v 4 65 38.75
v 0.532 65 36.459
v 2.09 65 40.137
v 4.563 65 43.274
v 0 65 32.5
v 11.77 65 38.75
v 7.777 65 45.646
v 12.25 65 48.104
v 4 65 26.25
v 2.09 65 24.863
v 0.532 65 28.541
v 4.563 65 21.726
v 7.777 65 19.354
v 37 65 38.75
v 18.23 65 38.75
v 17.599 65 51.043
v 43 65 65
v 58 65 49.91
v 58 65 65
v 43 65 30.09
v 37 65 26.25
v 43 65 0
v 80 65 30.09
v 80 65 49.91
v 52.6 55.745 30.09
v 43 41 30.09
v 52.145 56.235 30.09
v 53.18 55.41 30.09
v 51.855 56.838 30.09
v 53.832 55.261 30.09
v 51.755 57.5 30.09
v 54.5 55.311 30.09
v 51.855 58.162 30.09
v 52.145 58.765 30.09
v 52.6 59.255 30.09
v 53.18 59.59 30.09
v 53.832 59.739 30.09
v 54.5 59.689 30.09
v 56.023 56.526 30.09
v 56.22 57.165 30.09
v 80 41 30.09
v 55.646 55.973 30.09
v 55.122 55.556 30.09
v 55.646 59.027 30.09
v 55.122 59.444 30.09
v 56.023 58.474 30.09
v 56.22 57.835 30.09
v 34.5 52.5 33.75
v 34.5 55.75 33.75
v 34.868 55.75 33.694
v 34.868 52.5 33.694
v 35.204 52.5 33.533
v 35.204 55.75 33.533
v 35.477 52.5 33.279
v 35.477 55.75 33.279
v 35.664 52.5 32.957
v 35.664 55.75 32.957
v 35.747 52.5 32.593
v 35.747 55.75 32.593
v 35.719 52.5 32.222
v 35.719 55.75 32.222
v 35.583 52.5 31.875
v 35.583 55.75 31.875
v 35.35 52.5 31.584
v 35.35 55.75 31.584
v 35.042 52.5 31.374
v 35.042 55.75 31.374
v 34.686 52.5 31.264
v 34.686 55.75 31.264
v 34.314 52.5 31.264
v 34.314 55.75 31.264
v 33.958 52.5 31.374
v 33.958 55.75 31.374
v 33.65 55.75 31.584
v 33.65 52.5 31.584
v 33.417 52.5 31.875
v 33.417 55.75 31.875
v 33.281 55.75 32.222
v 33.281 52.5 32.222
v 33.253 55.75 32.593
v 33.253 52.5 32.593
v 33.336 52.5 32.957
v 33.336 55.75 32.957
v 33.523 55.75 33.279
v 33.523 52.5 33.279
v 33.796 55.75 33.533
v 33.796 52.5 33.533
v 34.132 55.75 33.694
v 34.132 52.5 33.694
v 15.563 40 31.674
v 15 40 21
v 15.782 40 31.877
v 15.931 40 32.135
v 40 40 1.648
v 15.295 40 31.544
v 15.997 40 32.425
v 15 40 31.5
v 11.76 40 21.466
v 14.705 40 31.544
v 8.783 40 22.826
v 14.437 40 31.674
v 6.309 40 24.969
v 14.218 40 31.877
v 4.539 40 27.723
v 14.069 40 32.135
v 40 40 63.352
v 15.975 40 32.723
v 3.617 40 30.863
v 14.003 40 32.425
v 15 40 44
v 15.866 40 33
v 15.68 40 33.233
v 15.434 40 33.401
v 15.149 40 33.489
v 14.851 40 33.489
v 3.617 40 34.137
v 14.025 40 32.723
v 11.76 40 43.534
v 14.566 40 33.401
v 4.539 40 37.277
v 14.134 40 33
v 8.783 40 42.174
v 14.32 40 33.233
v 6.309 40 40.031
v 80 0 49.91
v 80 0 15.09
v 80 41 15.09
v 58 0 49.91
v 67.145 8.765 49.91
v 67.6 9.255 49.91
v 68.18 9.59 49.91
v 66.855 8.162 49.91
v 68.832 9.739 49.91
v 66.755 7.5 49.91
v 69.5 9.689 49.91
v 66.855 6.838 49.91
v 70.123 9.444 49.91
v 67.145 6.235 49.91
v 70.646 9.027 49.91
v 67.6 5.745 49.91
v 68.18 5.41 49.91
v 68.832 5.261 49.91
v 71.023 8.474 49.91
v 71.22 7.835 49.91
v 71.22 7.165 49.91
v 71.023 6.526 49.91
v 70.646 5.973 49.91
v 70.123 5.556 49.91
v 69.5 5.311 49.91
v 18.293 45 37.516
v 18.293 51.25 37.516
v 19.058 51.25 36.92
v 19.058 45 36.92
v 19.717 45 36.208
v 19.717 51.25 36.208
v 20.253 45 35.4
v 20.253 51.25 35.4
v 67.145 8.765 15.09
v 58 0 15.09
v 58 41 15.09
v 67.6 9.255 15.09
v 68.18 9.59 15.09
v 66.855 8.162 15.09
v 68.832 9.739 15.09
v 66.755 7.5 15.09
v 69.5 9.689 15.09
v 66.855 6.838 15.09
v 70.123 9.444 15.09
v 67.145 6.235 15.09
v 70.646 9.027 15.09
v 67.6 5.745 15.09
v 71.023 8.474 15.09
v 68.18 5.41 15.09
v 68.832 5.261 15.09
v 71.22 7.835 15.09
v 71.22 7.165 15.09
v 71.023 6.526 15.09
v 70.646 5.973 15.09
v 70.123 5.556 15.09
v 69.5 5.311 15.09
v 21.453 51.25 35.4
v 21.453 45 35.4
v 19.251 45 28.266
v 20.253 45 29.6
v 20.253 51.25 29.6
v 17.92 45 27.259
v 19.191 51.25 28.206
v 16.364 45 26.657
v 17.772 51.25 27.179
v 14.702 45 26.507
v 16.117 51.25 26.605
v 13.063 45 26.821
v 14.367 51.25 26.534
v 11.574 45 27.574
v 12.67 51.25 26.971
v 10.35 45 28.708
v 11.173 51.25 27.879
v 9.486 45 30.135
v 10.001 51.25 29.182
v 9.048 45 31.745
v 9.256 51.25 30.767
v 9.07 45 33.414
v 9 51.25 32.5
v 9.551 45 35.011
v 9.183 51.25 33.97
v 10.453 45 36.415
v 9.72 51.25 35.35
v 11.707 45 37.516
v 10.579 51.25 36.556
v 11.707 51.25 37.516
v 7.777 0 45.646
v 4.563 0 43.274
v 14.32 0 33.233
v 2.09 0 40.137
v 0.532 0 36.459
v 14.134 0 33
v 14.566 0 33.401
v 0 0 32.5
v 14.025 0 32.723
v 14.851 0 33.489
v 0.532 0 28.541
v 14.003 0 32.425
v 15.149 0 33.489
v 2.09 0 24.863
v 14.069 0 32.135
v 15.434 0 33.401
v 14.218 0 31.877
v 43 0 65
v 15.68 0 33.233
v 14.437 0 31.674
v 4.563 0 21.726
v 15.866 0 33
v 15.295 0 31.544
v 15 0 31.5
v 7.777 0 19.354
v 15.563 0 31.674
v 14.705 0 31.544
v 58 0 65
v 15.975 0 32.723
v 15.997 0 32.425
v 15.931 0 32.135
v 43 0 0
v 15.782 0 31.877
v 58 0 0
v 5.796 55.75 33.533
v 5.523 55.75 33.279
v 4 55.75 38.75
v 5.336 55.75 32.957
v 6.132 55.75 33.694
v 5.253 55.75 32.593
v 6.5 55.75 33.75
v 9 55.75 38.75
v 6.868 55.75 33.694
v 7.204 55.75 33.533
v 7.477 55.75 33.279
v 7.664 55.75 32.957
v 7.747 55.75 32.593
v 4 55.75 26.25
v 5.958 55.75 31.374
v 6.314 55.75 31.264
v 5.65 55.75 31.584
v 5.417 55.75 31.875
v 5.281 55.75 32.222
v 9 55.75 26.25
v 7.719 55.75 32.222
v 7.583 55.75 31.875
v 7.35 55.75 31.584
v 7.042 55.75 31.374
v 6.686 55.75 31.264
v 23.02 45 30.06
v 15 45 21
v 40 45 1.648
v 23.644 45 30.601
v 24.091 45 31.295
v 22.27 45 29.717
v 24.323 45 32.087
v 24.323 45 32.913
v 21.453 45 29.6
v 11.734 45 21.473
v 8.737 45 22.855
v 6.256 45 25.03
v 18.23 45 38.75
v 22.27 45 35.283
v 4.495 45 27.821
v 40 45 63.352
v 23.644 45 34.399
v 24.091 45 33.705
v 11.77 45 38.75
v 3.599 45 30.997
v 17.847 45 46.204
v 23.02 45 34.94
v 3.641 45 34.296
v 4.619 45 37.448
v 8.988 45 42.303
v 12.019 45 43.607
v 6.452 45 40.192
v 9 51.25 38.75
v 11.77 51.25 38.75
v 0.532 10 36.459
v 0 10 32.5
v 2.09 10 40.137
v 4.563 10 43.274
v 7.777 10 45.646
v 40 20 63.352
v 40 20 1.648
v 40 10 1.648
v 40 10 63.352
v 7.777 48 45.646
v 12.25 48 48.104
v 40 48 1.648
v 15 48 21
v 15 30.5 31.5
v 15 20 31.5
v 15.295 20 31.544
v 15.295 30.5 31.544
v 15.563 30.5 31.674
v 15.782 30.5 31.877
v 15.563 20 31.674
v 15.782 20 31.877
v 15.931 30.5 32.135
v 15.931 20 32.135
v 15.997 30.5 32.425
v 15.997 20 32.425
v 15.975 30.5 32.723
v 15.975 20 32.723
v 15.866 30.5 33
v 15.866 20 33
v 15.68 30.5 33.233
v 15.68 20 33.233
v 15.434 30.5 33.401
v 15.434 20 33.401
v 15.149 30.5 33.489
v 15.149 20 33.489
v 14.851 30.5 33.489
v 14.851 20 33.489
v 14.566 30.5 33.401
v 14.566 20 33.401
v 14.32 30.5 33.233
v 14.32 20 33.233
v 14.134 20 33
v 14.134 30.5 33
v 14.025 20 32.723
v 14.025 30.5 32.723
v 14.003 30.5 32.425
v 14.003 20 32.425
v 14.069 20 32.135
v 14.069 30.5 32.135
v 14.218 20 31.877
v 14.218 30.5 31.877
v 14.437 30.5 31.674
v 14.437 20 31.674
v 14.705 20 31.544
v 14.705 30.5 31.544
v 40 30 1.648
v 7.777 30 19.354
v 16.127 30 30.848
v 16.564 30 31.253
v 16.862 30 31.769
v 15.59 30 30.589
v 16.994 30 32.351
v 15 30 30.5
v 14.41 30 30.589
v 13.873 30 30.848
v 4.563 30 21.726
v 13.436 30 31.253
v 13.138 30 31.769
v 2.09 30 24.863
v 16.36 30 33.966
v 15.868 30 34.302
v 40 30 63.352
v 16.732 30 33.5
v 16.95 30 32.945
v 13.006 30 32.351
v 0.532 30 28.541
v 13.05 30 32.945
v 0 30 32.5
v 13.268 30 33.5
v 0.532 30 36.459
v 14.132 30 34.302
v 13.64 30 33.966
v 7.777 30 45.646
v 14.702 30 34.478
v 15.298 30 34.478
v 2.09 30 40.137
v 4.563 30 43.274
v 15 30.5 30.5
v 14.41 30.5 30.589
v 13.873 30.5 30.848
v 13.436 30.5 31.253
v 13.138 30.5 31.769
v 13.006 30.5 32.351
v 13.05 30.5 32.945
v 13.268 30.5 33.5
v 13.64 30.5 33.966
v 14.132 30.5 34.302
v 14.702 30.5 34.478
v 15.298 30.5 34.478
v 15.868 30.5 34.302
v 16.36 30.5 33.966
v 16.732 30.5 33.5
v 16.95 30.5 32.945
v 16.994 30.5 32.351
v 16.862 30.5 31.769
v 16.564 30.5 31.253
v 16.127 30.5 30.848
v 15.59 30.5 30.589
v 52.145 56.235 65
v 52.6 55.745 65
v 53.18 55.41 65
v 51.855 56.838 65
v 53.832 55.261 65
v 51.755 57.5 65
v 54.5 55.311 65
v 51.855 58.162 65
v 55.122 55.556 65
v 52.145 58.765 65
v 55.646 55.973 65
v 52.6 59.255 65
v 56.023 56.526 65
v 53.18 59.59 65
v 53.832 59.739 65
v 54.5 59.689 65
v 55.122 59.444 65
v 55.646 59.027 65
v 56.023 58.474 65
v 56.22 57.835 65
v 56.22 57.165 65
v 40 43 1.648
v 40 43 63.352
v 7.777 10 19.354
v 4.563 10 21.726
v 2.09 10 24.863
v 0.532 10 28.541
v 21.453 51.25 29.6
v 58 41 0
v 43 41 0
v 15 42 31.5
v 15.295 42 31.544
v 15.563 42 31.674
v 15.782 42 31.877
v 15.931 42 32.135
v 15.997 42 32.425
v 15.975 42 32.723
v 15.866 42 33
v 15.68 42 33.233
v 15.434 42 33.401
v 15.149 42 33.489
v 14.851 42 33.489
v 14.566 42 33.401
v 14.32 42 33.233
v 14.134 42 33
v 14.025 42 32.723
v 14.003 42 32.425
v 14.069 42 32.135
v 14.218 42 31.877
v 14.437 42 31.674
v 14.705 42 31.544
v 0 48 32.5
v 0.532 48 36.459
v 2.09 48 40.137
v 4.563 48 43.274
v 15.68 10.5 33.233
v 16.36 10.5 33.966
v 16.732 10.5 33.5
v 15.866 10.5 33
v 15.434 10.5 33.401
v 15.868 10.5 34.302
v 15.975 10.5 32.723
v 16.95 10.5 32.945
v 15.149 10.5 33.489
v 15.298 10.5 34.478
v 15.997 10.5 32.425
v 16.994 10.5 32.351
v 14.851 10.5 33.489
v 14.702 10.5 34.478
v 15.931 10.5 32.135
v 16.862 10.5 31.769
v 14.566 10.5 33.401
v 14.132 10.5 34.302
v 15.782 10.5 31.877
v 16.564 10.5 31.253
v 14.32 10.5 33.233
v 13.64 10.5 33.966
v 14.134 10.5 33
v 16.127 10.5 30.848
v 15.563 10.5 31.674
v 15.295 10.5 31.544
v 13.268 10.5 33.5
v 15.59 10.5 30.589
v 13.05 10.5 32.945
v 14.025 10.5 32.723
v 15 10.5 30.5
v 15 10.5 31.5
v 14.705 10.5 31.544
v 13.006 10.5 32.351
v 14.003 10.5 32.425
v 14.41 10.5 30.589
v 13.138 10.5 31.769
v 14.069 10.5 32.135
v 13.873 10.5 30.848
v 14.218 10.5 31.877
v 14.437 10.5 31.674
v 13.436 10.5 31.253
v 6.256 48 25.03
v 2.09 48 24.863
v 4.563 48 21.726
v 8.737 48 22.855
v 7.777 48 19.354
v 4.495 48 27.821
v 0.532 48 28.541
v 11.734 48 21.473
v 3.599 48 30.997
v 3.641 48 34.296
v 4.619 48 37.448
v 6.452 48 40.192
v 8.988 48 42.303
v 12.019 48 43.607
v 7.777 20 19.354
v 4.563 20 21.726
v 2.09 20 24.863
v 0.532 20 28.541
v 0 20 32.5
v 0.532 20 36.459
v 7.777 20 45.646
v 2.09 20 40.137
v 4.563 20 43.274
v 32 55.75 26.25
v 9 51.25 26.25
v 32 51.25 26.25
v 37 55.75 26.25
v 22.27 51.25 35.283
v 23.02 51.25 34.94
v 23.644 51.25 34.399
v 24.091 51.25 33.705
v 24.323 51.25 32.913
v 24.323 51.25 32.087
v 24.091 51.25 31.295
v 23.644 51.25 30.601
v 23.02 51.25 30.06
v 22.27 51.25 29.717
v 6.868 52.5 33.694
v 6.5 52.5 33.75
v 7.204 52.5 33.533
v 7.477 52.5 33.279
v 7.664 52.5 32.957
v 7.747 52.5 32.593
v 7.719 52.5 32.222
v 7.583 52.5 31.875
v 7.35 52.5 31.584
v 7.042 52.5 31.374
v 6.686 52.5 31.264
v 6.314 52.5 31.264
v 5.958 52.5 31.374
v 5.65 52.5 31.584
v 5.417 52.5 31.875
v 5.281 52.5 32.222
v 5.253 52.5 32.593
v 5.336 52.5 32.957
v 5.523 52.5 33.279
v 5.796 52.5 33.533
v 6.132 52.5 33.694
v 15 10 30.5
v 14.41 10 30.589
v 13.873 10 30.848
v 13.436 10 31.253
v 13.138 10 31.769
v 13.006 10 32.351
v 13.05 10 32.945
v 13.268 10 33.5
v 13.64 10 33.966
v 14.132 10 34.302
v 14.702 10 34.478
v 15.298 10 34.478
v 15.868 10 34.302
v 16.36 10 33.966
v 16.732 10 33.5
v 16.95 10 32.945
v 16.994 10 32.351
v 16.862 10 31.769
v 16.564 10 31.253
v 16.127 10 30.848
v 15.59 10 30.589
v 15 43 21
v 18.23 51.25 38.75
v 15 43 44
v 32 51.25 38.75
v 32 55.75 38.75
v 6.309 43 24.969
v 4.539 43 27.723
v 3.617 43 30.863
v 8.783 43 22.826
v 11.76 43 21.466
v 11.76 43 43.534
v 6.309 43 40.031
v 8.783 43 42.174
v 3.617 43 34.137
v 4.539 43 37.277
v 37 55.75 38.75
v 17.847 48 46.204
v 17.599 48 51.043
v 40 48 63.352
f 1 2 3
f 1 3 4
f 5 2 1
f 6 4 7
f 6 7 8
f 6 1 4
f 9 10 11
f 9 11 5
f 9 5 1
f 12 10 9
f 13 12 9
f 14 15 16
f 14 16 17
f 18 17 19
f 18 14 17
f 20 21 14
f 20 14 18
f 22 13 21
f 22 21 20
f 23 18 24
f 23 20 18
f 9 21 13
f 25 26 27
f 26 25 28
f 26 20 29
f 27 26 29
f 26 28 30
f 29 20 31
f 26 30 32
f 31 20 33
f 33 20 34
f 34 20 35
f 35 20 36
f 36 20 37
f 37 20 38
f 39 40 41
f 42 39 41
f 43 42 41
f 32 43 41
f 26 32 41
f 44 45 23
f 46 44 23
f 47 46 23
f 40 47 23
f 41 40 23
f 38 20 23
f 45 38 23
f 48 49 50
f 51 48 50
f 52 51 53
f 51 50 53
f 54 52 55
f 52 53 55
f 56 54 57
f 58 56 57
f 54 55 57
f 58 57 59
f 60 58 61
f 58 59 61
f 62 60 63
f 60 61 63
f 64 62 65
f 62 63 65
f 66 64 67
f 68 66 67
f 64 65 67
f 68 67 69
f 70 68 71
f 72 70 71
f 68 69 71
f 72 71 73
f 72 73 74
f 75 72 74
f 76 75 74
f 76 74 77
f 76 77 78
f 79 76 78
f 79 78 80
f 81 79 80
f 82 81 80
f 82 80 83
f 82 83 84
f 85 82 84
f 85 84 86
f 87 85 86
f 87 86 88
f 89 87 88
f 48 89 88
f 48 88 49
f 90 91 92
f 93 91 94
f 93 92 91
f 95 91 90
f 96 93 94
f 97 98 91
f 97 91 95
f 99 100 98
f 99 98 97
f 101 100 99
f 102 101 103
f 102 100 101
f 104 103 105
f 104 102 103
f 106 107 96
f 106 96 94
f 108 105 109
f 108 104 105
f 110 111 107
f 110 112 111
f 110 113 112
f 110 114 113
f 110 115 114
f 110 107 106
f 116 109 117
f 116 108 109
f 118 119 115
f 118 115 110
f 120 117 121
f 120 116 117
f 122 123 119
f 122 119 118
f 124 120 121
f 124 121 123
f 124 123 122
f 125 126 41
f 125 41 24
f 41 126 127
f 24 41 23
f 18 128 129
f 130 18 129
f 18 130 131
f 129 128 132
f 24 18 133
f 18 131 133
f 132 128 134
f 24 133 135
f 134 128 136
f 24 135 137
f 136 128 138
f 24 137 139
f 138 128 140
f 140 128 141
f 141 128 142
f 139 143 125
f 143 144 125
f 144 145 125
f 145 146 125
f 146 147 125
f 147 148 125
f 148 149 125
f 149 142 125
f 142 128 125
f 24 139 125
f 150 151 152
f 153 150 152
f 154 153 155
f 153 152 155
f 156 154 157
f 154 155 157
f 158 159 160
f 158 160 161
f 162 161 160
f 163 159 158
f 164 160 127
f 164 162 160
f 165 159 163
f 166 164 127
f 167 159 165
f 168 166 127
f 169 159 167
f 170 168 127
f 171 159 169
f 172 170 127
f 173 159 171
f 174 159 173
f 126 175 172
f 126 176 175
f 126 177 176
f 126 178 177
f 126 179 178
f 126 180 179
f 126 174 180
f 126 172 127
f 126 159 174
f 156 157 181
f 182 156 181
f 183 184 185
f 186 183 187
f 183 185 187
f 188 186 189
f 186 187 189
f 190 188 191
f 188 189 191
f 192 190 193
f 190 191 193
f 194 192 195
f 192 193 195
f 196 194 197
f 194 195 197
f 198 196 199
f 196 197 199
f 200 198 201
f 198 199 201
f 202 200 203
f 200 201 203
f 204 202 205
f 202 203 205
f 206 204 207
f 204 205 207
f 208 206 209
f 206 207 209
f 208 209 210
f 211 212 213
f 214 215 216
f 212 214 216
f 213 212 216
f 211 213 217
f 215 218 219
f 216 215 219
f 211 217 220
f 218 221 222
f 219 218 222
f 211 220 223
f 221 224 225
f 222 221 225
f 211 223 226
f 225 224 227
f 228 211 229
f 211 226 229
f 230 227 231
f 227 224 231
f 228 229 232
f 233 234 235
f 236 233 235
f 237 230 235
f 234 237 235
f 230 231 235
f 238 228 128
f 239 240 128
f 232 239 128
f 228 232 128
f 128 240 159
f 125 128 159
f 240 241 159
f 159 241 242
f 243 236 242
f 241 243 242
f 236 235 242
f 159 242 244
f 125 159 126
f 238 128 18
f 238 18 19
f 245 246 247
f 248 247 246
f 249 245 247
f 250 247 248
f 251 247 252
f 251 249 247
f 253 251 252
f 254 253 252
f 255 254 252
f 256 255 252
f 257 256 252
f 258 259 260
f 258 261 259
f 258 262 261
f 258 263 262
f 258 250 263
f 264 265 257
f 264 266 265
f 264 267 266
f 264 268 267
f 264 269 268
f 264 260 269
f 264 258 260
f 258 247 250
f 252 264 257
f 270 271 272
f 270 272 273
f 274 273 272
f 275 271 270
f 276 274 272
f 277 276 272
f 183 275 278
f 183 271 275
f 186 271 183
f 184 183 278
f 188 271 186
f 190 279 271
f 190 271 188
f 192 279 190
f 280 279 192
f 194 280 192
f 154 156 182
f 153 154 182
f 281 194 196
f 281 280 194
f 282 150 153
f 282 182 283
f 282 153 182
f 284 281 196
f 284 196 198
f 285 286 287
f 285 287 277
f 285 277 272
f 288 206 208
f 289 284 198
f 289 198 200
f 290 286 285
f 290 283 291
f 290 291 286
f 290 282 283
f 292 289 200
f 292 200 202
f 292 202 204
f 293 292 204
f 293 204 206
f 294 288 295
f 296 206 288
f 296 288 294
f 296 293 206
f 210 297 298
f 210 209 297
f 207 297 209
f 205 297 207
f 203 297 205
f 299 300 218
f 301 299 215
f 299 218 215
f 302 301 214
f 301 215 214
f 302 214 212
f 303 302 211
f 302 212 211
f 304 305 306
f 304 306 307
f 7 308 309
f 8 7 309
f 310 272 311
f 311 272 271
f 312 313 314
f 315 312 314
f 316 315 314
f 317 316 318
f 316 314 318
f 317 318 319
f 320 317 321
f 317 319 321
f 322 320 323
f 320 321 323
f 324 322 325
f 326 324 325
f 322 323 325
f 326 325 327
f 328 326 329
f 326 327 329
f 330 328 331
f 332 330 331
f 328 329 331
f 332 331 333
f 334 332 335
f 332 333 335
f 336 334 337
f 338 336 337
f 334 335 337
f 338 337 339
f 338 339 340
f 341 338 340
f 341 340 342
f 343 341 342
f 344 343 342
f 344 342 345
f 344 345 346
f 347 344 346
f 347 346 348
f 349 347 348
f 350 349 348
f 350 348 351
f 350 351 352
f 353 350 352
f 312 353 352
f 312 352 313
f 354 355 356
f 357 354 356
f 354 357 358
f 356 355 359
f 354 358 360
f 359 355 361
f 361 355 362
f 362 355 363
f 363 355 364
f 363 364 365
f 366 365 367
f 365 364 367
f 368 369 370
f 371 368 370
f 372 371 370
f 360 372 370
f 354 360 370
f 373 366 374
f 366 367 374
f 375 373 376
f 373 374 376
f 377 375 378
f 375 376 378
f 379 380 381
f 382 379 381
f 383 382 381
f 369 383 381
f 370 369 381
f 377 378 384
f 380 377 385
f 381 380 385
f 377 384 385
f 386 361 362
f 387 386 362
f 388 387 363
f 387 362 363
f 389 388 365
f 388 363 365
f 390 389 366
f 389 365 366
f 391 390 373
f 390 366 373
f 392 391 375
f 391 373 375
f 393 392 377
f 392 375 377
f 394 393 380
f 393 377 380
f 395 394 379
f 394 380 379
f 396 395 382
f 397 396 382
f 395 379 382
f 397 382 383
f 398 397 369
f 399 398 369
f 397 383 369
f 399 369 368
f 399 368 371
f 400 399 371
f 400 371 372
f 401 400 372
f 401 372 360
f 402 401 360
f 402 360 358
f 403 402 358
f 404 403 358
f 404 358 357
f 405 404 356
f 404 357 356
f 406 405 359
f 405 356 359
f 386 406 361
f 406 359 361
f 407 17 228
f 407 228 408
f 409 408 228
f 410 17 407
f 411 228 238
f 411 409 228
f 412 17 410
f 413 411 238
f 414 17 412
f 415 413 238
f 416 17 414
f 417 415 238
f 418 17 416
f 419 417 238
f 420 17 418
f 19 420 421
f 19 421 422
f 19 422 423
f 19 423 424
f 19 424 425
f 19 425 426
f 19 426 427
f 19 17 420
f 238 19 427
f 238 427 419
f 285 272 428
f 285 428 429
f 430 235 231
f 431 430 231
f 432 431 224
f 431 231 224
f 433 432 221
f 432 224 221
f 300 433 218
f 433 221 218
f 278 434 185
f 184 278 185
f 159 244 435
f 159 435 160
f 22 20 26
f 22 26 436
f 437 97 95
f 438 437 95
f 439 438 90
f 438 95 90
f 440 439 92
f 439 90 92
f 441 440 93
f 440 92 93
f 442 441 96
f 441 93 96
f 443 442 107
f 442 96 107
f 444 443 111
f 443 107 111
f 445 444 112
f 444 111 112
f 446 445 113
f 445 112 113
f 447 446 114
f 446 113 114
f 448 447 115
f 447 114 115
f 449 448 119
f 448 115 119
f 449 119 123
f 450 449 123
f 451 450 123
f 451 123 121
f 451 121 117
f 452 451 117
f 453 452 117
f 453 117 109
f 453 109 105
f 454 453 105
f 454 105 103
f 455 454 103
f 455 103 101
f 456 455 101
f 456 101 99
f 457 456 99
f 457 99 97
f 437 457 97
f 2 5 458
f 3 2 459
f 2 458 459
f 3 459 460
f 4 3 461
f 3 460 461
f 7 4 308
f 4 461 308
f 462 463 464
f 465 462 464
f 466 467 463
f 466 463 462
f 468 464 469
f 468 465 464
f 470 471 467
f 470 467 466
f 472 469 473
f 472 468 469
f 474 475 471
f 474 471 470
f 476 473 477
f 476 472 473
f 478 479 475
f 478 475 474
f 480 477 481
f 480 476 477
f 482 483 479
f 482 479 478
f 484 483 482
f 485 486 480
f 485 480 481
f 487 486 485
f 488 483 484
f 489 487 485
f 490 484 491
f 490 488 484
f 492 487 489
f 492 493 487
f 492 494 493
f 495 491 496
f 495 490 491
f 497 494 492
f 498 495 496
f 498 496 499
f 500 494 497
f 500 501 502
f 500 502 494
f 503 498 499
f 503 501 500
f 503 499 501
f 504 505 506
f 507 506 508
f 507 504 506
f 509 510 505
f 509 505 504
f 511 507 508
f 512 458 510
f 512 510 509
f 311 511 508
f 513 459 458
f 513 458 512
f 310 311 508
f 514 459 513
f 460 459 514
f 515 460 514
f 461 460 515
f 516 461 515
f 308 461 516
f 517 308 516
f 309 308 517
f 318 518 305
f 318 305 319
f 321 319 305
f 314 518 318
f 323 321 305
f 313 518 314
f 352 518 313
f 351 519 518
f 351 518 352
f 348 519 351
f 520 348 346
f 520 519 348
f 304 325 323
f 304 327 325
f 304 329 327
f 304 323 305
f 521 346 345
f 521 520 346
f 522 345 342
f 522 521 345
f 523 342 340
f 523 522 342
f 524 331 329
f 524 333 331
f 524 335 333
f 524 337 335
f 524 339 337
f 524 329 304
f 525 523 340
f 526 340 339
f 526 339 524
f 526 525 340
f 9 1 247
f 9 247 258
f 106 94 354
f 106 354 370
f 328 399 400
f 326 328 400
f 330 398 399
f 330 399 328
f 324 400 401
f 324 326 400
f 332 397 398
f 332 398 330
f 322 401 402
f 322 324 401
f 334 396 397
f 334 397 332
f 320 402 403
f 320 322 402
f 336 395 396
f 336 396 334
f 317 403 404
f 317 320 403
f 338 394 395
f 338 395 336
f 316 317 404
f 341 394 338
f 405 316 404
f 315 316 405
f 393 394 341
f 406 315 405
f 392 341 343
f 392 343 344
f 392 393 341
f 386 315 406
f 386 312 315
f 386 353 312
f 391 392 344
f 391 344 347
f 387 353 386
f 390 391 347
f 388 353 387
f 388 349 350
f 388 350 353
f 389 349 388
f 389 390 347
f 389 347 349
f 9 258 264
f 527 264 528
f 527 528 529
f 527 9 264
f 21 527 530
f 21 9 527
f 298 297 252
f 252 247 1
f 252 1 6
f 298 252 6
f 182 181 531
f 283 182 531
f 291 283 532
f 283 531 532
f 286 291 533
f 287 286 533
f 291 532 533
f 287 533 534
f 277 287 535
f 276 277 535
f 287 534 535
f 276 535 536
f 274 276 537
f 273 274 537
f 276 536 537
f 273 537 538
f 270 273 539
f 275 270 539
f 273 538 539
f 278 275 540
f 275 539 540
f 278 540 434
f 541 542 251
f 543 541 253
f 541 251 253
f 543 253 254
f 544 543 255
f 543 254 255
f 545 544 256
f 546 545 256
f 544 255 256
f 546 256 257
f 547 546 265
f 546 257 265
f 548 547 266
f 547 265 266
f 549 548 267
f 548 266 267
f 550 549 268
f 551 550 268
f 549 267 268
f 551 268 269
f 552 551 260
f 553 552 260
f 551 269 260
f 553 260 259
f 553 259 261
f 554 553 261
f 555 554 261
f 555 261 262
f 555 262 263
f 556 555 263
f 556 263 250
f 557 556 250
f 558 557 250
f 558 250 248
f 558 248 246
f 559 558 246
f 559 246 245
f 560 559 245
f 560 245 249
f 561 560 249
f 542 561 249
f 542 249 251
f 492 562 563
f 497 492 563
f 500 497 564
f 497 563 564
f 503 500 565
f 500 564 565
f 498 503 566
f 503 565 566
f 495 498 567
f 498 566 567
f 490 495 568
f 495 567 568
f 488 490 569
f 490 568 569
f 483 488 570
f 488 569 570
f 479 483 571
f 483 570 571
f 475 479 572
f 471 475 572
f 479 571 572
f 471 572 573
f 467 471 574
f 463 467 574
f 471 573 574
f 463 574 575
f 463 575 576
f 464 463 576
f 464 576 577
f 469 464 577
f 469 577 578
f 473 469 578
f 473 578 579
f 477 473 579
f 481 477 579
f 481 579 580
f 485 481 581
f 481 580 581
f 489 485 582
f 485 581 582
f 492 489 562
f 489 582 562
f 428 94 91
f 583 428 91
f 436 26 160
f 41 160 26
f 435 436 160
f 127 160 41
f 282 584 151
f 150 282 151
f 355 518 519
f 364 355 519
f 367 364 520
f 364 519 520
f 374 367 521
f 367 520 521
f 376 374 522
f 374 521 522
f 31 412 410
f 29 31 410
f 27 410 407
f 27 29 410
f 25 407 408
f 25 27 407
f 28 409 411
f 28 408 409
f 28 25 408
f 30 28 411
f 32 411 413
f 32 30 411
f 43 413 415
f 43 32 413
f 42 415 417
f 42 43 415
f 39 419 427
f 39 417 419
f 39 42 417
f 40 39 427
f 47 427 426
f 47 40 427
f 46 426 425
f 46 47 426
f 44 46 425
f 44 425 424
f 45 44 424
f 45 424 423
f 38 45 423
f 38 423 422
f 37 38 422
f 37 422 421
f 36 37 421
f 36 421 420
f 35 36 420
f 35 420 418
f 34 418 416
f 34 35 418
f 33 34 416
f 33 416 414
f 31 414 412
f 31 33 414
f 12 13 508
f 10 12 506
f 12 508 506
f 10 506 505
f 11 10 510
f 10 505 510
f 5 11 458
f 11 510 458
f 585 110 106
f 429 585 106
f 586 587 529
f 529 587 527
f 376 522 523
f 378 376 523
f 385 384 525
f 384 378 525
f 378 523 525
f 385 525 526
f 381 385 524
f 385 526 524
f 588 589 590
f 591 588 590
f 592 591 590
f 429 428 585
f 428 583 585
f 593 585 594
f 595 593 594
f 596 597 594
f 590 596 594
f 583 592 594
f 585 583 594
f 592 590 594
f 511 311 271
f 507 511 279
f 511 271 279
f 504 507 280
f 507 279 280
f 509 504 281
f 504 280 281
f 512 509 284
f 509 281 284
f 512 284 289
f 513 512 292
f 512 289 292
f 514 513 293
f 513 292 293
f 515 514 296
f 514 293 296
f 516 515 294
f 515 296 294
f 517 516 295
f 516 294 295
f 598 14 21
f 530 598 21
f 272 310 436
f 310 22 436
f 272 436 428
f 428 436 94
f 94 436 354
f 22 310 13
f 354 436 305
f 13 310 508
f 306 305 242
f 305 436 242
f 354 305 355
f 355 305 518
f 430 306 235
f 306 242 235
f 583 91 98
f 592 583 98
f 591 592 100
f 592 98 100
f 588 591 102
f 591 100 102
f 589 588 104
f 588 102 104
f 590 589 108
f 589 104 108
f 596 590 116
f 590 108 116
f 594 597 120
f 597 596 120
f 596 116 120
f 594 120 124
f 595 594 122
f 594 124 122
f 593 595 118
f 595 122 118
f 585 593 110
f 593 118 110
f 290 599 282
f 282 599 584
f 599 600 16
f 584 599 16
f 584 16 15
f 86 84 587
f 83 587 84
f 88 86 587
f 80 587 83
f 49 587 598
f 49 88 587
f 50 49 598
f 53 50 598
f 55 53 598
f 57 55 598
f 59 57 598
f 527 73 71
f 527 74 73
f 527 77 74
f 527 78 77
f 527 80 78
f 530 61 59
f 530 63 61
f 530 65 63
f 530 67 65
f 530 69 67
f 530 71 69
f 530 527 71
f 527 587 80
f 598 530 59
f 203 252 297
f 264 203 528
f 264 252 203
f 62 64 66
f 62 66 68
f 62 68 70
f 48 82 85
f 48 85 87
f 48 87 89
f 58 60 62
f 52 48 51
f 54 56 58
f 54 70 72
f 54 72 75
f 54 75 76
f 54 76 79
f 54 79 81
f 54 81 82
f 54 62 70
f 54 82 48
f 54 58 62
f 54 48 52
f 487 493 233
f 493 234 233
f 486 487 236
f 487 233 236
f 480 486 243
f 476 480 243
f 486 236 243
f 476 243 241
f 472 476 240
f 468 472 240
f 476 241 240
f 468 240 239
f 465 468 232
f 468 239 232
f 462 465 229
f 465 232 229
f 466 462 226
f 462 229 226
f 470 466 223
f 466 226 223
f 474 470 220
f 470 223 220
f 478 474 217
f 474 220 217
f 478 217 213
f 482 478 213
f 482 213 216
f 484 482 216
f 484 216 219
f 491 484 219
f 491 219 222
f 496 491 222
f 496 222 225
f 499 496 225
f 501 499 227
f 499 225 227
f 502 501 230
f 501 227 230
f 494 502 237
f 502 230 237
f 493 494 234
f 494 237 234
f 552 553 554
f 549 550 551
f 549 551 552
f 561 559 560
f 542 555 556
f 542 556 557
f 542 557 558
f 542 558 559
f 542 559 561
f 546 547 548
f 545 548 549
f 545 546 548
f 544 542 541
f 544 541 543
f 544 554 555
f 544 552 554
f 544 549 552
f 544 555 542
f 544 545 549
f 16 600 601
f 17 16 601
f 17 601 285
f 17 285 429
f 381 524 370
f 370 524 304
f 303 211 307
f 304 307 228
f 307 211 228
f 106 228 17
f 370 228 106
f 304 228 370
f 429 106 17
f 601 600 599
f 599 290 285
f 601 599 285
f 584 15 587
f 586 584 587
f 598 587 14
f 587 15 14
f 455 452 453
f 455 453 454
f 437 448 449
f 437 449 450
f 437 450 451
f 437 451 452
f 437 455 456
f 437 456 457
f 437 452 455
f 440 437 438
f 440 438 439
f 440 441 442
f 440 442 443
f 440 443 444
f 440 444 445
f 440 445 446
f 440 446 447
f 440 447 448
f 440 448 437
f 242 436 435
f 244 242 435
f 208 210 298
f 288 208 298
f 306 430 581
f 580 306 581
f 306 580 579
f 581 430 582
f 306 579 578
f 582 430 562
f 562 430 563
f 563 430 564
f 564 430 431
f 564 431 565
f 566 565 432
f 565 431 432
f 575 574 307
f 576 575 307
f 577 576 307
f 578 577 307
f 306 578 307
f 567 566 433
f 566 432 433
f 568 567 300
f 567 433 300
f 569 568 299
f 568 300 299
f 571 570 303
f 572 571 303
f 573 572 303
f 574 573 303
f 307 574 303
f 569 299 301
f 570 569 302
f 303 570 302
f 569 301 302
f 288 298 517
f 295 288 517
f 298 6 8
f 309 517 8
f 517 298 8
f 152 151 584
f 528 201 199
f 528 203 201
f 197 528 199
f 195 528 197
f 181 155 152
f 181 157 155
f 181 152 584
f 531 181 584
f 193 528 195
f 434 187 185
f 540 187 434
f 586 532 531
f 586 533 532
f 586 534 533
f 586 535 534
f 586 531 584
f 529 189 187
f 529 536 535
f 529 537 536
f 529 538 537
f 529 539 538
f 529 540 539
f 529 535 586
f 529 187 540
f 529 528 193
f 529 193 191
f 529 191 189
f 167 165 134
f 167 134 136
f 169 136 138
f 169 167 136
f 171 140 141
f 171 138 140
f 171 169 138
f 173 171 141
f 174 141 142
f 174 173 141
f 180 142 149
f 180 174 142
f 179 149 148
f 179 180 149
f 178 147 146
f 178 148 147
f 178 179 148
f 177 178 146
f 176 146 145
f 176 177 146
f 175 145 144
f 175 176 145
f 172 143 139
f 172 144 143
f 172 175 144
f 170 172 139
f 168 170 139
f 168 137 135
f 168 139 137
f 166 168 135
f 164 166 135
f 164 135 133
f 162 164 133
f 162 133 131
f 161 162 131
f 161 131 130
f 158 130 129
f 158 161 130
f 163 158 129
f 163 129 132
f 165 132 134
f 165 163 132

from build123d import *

# Parameters (mm, degrees)
SKETCH1_W               = 80
SKETCH1_H               = 65
BOSS_EXTRUDE1_DEPTH     = 65
SKETCH3_W               = 22
SKETCH3_H               = 15.09
CUT_EXTRUDE1_DEPTH      = 65.72
CUT_EXTRUDE2_DEPTH      = 20
CUT_EXTRUDE2_DEPTH_BACK = 55.72
SKETCH4_R               = 2.245
SKETCH4_R_2             = 2.24505
SKETCH5_W               = 65
SKETCH5_H               = 10
SKETCH5_H_2             = 2
CUT_EXTRUDE3_DEPTH      = 40
CUT_EXTRUDE4_DEPTH      = 65
SKETCH10_R              = 1
CUT_EXTRUDE6_DEPTH      = 42
SKETCH12_R              = 2.9
SKETCH12_R_2            = 6
CUT_EXTRUDE7_DEPTH      = 20
SKETCH14_W              = 23
SKETCH14_H              = 12.5
CUT_EXTRUDE9_DEPTH      = 13.75
SKETCH16_W              = 5
SKETCH16_H              = 12.5
SKETCH16_R              = 1.25
CUT_EXTRUDE10_DEPTH     = 9.25
SKETCH16_4_R            = 1.25
CUT_EXTRUDE11_DEPTH     = 12.5
CUT_EXTRUDE12_DEPTH     = 21.5
CUT_EXTRUDE13_DEPTH     = 8
SKETCH20_R              = 2
BOSS_EXTRUDE2_DEPTH     = 0.5
SKETCH21_R              = 2
BOSS_EXTRUDE3_DEPTH     = 0.5
SKETCH22_R              = 1
CUT_EXTRUDE14_DEPTH     = 30.5
SKETCH23_W              = 37
SKETCH23_H              = 30.09
CUT_EXTRUDE15_DEPTH     = 24


with BuildPart() as part:
    # Sketch1 → Boss-Extrude1 (new body)
    with BuildSketch(Plane.XY):
        with Locations((40, 32.5)):
            Rectangle(SKETCH1_W, SKETCH1_H)
    extrude(amount=BOSS_EXTRUDE1_DEPTH)

    # Sketch3 → Cut-Extrude1 (cut)
    with BuildSketch(Plane.XZ):
        with Locations((69, 57.455)):
            Rectangle(SKETCH3_W, SKETCH3_H)
        with Locations((69, 7.545)):
            Rectangle(SKETCH3_W, SKETCH3_H)
    extrude(amount=-CUT_EXTRUDE1_DEPTH, mode=Mode.SUBTRACT)

    # Sketch4 → Cut-Extrude2 (cut, two sides: drawn at the far end of the back side and taken through both)
    with BuildSketch(Plane.XY.offset(49.91).offset(-CUT_EXTRUDE2_DEPTH_BACK)):
        with Locations(Location((54, 57.5, 0), (0, 0, 180))):
            Circle(SKETCH4_R)
        with Locations(Location((69, 7.5, 0), (0, 0, 180))):
            Circle(SKETCH4_R_2)
    extrude(amount=CUT_EXTRUDE2_DEPTH + CUT_EXTRUDE2_DEPTH_BACK, mode=Mode.SUBTRACT)

    # Sketch5 → Cut-Extrude3 (cut)
    with BuildSketch(Plane.ZY):
        with Locations((32.5, 35)):
            Rectangle(SKETCH5_W, SKETCH5_H)
        with Locations((32.5, 15)):
            Rectangle(SKETCH5_W, SKETCH5_H)
        with Locations((32.5, 44)):
            Rectangle(SKETCH5_W, SKETCH5_H_2)
    extrude(amount=-CUT_EXTRUDE3_DEPTH, mode=Mode.SUBTRACT)

    # Sketch6 → Cut-Extrude4 (cut)
    with BuildSketch(Plane.XZ):
        with BuildLine():
            Line((0, 0), (43, 0))
            Line((43, 0), (7.776682895, 19.353757571))
            ThreePointArc((7.776682895, 19.353757571), (2.089737482, 24.862911437), (0, 32.5))
            Line((0, 32.5), (0, 0))
        make_face()
        with BuildLine():
            Line((0, 65), (0, 32.5))
            ThreePointArc((0, 32.5), (2.089737482, 40.137088563), (7.776682895, 45.646242429))
            Line((7.776682895, 45.646242429), (43, 65))
            Line((43, 65), (0, 65))
        make_face()
    extrude(amount=-CUT_EXTRUDE4_DEPTH, mode=Mode.SUBTRACT)

    # Sketch10 → Cut-Extrude6 (cut)
    with BuildSketch(Plane.XZ):
        with Locations(Location((15, 32.5, 0), (0, 0, 270))):
            Circle(SKETCH10_R)
    extrude(amount=-CUT_EXTRUDE6_DEPTH, mode=Mode.SUBTRACT)

    # Sketch12 → Cut-Extrude7 (cut)
    with BuildSketch(Plane(origin=(0, 65, 0), x_dir=(1, 0, 0), z_dir=(0, 1, 0))):
        with Locations((21.452618395, -32.5)):
            Circle(SKETCH12_R)
        with Locations((15, -32.5)):
            Circle(SKETCH12_R_2)
        with BuildLine():
            Line((21.452618395, -29.6), (20.252618395, -29.6))
            ThreePointArc((20.252618395, -29.6), (20.309467908, -29.705442695), (20.364201004, -29.811999333))
            ThreePointArc((20.364201004, -29.811999333), (20.898182616, -29.653493199), (21.452618395, -29.6))
        make_face()
        with BuildLine():
            ThreePointArc((20.364201004, -35.188000667), (20.309467908, -35.294557305), (20.252618395, -35.4))
            Line((20.252618395, -35.4), (21.452618395, -35.4))
            ThreePointArc((21.452618395, -35.4), (20.898182616, -35.346506801), (20.364201004, -35.188000667))
        make_face()
    extrude(amount=-CUT_EXTRUDE7_DEPTH, mode=Mode.SUBTRACT)

    # Sketch14 → Cut-Extrude9 (cut)
    with BuildSketch(Plane(origin=(0, 65, 0), x_dir=(1, 0, 0), z_dir=(0, 1, 0))):
        with Locations((20.5, -32.5)):
            Rectangle(SKETCH14_W, SKETCH14_H)
    extrude(amount=-CUT_EXTRUDE9_DEPTH, mode=Mode.SUBTRACT)

    # Sketch16 → Cut-Extrude10 (cut)
    # profile 1 of 4: a face of its own
    with BuildSketch(Plane(origin=(0, 65, 0), x_dir=(1, 0, 0), z_dir=(0, 1, 0))):
        with Locations((6.5, -32.5)):
            Rectangle(SKETCH16_W, SKETCH16_H)
        with Locations((6.5, -32.5)):
            Circle(SKETCH16_R, mode=Mode.SUBTRACT)
    # profile 2 of 4: a face of its own
    with BuildSketch(Plane(origin=(0, 65, 0), x_dir=(1, 0, 0), z_dir=(0, 1, 0))):
        with Locations((6.5, -32.5)):
            Circle(SKETCH16_R)
    # profile 3 of 4: a face of its own
    with BuildSketch(Plane(origin=(0, 65, 0), x_dir=(1, 0, 0), z_dir=(0, 1, 0))):
        with Locations((34.5, -32.5)):
            Rectangle(SKETCH16_W, SKETCH16_H)
        with Locations((34.5, -32.5)):
            Circle(SKETCH16_R, mode=Mode.SUBTRACT)
    # profile 4 of 4: a face of its own
    with BuildSketch(Plane(origin=(0, 65, 0), x_dir=(1, 0, 0), z_dir=(0, 1, 0))):
        with Locations((34.5, -32.5)):
            Circle(SKETCH16_R)
    extrude(amount=-CUT_EXTRUDE10_DEPTH, mode=Mode.SUBTRACT)

    # Sketch16<4> → Cut-Extrude11 (cut)
    with BuildSketch(Plane(origin=(0, 65, 0), x_dir=(1, 0, 0), z_dir=(0, 1, 0))):
        with Locations(Location((6.5, -32.5, 0), (0, 0, 270))):
            Circle(SKETCH16_4_R)
        with Locations(Location((34.5, -32.5, 0), (0, 0, 270))):
            Circle(SKETCH16_4_R)
    extrude(amount=-CUT_EXTRUDE11_DEPTH, mode=Mode.SUBTRACT)

    # Sketch18 → Cut-Extrude12 (cut)
    with BuildSketch(Plane(origin=(0, 65, 0), x_dir=(1, 0, 0), z_dir=(0, 1, 0))):
        with BuildLine():
            ThreePointArc((18.531385071, -32.863069526), (15, -36.05), (11.468614929, -32.863069526))
            Line((11.468614929, -32.863069526), (11.770443602, -38.75))
            Line((11.770443602, -38.75), (18.229556398, -38.75))
            Line((18.229556398, -38.75), (18.531385071, -32.863069526))
        make_face()
        with BuildLine():
            Line((15.593717104, -29), (14.406282896, -29))
            ThreePointArc((14.406282896, -29), (12.287971634, -30.209279122), (11.45, -32.5))
            Line((11.45, -32.5), (11.468614929, -32.863069526))
            ThreePointArc((11.468614929, -32.863069526), (15, -36.05), (18.531385071, -32.863069526))
            Line((18.531385071, -32.863069526), (18.55, -32.5))
            ThreePointArc((18.55, -32.5), (17.712028366, -30.209279122), (15.593717104, -29))
        make_face()
        with BuildLine():
            ThreePointArc((15.593717104, -29), (15, -28.95), (14.406282896, -29))
            Line((14.406282896, -29), (15.593717104, -29))
        make_face()
        Polygon((18.229556398, -38.75), (11.770443602, -38.75), (12.25004092, -48.104167856), (17.599264584, -51.043345268), align=None)
    extrude(amount=-CUT_EXTRUDE12_DEPTH, mode=Mode.SUBTRACT)

    # Sketch19 → Cut-Extrude13 (cut)
    with BuildSketch(Plane.XZ.offset(-40)):
        with BuildLine():
            Line((15, 44), (40, 63.351623939))
            Line((40, 63.351623939), (7.776682895, 45.646242429))
            ThreePointArc((7.776682895, 45.646242429), (0, 32.5), (7.776682895, 19.353757571))
            Line((7.776682895, 19.353757571), (40, 1.648376061))
            Line((40, 1.648376061), (15, 21))
            ThreePointArc((15, 21), (3.5, 32.5), (15, 44))
        make_face()
    extrude(amount=-CUT_EXTRUDE13_DEPTH, mode=Mode.SUBTRACT)

    # Sketch20 → Boss-Extrude2 (add)
    with BuildSketch(Plane(origin=(0, 30, 0), x_dir=(1, 0, 0), z_dir=(0, 1, 0))):
        with Locations(Location((15, -32.5, 0), (0, 0, 90))):
            Circle(SKETCH20_R)
    extrude(amount=BOSS_EXTRUDE2_DEPTH)

    # Sketch21 → Boss-Extrude3 (add)
    with BuildSketch(Plane(origin=(0, 10, 0), x_dir=(1, 0, 0), z_dir=(0, 1, 0))):
        with Locations(Location((15, -32.5, 0), (0, 0, 90))):
            Circle(SKETCH21_R)
    extrude(amount=BOSS_EXTRUDE3_DEPTH)

    # Sketch22 → Cut-Extrude14 (cut)
    with BuildSketch(Plane.XZ):
        with Locations(Location((15, 32.5, 0), (0, 0, 270))):
            Circle(SKETCH22_R)
    extrude(amount=-CUT_EXTRUDE14_DEPTH, mode=Mode.SUBTRACT)

    # Sketch23 → Cut-Extrude15 (cut)
    with BuildSketch(Plane(origin=(0, 65, 0), x_dir=(1, 0, 0), z_dir=(0, 1, 0))):
        with Locations((61.5, -15.045)):
            Rectangle(SKETCH23_W, SKETCH23_H)
    extrude(amount=-CUT_EXTRUDE15_DEPTH, mode=Mode.SUBTRACT)


solid = part.part
